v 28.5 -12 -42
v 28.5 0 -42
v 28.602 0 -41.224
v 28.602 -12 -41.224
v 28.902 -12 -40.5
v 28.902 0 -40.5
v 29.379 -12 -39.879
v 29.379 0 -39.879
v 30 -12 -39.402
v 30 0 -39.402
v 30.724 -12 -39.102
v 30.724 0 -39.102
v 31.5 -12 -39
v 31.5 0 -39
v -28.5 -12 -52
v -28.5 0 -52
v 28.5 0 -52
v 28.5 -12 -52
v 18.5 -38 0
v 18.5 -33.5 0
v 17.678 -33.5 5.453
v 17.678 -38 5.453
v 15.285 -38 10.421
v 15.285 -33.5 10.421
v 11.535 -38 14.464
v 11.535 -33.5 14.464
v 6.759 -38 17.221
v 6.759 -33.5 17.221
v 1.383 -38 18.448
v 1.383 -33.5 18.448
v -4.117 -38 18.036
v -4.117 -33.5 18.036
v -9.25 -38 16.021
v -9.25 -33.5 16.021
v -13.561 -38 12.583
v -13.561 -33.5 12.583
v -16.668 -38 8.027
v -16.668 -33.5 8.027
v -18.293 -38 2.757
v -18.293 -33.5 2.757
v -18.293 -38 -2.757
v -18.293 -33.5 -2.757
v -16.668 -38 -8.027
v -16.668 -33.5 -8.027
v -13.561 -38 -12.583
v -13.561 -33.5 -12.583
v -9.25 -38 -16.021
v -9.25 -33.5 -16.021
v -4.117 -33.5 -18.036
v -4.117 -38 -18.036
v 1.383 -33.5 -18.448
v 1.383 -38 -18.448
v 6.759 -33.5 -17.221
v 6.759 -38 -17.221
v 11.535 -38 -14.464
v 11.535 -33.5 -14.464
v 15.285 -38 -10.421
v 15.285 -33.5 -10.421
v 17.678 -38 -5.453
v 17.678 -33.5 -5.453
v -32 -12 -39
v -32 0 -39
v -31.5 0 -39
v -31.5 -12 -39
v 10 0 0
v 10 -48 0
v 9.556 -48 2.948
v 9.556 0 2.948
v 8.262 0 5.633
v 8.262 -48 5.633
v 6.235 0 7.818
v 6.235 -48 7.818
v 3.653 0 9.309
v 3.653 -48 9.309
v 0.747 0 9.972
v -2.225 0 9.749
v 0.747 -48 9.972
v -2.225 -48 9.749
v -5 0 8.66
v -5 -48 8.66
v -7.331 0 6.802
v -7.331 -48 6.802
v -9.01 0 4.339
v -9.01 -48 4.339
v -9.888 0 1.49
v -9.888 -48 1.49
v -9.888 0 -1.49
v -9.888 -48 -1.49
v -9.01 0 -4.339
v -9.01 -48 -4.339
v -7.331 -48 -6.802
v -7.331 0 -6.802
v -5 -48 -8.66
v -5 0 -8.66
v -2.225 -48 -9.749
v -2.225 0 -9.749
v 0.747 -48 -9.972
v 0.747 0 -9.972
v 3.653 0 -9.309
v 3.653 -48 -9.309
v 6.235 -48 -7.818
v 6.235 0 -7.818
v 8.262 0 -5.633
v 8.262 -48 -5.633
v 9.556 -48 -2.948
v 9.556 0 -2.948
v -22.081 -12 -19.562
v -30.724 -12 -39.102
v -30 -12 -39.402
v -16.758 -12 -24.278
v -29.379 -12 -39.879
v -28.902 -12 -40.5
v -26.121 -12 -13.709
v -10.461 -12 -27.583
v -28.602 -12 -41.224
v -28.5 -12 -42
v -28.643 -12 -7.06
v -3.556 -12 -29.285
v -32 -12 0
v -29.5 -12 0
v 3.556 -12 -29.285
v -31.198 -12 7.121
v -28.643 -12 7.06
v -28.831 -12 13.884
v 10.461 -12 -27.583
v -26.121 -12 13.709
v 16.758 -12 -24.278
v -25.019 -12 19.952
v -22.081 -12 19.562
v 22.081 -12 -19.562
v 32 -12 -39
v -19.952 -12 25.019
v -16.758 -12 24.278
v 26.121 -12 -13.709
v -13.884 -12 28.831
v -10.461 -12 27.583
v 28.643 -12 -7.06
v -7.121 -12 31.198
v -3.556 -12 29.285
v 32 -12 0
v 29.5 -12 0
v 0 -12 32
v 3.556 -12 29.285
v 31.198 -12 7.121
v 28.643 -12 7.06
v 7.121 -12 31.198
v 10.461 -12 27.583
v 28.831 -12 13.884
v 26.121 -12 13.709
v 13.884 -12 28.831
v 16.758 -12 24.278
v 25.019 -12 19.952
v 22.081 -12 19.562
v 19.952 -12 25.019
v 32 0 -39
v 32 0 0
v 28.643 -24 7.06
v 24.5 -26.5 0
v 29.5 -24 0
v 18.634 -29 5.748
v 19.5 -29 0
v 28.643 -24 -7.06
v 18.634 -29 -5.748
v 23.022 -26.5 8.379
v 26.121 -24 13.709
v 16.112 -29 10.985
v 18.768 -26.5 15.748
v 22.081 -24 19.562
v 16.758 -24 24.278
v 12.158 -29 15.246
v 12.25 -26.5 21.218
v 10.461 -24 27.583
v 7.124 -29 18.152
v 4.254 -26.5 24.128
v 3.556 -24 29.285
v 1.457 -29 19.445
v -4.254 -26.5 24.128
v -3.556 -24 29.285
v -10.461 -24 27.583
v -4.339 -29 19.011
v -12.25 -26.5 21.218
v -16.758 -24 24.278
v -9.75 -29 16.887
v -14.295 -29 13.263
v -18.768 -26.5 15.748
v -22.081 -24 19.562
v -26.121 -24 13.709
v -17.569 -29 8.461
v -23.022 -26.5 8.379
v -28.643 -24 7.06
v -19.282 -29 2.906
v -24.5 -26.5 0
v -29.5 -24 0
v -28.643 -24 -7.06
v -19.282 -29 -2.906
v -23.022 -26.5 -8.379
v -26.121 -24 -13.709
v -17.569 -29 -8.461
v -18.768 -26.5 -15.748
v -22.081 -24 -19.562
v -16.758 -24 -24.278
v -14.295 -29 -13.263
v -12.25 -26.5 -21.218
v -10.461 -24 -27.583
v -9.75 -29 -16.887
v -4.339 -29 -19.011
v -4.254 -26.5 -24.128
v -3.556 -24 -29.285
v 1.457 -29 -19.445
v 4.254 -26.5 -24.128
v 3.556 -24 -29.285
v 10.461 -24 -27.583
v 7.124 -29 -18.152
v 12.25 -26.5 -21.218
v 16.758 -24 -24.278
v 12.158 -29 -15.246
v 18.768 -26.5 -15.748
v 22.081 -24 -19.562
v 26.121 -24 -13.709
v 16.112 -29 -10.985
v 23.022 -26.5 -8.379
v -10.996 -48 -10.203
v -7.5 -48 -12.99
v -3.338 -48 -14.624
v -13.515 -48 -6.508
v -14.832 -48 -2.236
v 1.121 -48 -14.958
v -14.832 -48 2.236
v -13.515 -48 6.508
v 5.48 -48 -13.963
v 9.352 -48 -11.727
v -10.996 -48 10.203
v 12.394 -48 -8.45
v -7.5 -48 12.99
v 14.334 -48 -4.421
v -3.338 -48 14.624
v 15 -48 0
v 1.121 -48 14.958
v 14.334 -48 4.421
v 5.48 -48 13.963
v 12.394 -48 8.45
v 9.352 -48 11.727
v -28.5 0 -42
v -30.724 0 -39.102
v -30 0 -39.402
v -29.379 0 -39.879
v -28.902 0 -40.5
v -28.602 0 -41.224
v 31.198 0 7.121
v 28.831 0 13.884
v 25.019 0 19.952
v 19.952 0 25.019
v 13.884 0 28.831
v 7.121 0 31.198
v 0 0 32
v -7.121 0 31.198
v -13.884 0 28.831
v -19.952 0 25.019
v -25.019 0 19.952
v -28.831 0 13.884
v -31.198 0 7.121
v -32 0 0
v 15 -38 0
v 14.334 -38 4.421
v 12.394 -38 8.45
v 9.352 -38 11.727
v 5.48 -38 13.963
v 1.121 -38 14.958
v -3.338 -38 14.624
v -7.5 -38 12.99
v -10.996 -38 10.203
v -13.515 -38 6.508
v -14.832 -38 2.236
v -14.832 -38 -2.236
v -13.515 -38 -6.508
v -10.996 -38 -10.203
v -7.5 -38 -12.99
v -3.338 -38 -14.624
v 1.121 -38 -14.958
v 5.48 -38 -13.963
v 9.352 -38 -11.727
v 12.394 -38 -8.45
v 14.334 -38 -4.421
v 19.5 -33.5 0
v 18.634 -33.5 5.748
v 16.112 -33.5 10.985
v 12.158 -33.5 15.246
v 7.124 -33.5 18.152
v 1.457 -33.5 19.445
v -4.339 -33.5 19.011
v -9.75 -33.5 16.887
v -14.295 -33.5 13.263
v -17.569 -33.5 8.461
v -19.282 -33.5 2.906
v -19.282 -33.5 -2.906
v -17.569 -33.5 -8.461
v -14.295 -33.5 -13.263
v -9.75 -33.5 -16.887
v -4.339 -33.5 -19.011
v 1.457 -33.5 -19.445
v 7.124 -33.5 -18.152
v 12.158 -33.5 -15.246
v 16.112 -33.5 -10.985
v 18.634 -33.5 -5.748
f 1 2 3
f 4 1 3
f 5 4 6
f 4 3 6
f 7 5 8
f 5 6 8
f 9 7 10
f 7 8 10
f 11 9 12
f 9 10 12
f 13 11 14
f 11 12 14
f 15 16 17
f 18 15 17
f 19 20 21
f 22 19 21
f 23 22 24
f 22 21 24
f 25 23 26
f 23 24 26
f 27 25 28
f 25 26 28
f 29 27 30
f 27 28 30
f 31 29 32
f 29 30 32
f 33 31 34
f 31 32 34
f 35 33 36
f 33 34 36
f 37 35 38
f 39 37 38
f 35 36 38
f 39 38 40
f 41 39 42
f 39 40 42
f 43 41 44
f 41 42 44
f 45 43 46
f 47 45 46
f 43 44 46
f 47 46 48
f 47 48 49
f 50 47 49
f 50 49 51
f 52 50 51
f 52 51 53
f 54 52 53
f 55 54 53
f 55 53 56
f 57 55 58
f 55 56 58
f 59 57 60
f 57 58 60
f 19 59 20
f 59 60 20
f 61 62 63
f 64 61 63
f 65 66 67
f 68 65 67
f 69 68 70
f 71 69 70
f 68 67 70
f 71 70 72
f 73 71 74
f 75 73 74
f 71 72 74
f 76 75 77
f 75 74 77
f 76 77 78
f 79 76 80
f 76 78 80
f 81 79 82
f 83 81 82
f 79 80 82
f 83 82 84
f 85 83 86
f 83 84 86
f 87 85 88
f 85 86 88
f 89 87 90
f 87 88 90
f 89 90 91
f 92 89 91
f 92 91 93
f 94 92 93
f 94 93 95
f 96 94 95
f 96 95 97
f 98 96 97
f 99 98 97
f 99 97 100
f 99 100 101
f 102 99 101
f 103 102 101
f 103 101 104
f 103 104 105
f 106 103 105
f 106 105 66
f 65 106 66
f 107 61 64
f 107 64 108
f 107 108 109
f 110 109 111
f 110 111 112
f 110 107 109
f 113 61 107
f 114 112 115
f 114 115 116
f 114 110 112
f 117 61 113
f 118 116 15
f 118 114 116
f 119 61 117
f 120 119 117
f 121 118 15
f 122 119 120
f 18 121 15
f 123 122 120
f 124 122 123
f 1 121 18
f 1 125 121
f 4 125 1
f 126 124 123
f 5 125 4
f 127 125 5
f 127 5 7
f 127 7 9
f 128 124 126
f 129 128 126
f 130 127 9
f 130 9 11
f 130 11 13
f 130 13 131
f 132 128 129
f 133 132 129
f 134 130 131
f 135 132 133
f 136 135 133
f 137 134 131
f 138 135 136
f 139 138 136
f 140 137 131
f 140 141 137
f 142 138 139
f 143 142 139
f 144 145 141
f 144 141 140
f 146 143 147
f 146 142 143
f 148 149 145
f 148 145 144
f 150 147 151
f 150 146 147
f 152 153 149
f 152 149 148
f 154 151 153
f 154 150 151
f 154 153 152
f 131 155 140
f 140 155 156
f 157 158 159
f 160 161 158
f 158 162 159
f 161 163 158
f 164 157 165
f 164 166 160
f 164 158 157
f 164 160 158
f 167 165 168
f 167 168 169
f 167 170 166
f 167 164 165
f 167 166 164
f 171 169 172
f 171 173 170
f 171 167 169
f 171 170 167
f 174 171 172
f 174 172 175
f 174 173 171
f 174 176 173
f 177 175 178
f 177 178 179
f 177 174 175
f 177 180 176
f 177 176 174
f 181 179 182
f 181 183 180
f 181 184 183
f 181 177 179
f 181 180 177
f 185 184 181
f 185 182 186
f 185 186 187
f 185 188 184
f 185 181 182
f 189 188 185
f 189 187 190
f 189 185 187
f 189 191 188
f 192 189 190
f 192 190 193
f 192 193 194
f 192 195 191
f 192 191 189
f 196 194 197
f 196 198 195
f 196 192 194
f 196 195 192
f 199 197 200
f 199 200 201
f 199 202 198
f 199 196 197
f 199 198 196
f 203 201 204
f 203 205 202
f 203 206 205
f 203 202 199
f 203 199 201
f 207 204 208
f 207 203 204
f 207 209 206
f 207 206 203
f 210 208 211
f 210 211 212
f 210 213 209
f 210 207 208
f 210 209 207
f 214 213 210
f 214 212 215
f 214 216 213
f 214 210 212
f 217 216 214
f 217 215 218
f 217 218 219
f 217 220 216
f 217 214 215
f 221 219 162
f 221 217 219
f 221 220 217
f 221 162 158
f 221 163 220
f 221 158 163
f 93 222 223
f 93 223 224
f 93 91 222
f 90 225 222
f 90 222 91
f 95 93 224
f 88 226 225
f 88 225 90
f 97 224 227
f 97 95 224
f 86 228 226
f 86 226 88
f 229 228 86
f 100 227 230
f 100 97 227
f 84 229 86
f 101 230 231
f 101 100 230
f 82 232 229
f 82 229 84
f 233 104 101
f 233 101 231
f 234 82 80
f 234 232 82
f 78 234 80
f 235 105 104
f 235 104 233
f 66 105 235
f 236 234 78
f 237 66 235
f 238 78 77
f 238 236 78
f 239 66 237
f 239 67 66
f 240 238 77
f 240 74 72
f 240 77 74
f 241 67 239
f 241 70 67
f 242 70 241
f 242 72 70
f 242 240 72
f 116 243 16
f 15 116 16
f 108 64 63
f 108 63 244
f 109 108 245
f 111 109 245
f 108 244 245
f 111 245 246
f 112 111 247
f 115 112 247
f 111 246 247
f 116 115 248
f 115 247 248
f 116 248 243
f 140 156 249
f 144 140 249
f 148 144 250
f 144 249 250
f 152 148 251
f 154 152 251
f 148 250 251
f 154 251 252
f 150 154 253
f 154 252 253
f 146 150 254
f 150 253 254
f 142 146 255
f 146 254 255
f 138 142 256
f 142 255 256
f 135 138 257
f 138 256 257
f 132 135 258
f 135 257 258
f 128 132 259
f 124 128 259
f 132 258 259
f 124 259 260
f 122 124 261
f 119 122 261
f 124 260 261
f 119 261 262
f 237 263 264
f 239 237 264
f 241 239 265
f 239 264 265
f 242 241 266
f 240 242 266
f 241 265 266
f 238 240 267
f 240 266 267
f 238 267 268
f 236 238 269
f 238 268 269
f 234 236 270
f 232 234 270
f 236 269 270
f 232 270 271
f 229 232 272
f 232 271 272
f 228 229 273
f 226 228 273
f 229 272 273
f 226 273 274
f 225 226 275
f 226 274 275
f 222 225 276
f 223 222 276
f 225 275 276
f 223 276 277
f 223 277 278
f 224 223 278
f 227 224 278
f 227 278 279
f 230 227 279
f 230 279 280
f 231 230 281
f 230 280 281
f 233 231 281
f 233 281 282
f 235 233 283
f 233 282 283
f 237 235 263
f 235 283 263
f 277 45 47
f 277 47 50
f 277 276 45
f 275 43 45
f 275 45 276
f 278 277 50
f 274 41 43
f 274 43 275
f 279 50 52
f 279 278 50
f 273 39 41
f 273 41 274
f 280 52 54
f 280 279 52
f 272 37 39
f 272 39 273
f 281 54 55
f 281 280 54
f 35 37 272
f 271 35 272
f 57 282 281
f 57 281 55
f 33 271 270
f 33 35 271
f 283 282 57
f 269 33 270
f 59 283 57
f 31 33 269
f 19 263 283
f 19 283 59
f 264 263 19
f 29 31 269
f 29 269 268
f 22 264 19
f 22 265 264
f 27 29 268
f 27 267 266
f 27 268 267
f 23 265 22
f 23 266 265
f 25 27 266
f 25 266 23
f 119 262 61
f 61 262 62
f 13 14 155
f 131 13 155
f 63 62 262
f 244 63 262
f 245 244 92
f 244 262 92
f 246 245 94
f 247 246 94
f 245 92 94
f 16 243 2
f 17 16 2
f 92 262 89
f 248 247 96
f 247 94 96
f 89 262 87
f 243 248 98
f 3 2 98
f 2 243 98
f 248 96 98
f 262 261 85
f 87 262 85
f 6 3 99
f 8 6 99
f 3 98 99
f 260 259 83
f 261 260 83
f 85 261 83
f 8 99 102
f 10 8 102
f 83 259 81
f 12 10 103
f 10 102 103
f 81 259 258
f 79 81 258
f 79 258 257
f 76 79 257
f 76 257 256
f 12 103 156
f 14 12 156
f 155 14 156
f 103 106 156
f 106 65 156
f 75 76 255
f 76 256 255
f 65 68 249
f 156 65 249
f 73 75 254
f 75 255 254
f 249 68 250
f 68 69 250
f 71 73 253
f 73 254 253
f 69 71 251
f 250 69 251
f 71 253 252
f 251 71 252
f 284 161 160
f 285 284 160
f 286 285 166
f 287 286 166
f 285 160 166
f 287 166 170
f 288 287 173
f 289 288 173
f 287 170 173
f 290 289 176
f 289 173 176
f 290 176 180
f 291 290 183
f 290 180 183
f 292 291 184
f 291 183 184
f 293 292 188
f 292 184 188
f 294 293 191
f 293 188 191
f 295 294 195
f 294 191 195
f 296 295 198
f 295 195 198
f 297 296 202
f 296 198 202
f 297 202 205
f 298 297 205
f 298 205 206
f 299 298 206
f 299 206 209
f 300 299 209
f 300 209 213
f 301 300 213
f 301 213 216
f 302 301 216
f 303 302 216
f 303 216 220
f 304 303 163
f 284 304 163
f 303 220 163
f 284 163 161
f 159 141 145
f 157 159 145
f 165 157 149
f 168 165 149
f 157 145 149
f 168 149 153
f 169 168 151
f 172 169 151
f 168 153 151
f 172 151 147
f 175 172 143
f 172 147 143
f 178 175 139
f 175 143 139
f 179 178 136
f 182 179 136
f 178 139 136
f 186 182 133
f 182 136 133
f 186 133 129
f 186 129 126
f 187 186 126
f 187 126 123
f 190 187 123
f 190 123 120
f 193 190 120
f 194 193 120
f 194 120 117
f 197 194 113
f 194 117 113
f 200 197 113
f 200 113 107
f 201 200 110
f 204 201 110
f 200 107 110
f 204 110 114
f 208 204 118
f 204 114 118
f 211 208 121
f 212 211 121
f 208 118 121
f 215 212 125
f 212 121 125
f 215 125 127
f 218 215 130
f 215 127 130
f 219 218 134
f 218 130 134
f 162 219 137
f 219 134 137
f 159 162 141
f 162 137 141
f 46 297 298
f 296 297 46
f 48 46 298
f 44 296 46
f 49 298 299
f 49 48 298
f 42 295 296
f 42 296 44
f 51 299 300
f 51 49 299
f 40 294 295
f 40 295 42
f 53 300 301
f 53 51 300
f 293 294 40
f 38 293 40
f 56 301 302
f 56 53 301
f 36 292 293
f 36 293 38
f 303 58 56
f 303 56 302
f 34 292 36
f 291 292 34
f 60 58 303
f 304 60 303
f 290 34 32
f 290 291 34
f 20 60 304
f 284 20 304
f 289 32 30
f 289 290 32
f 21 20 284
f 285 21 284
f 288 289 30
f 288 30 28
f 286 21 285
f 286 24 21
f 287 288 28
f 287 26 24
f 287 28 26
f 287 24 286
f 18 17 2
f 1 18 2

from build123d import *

# Parameters (mm, degrees)
F1_DEPTH  = 12
F2_R      = 29.5
F3_DEPTH  = 12
F3_FACE_R = 29.5
F5_R      = 19.5
F7_DEPTH  = 4.5
F8_R      = 18.5
F9_DEPTH  = 4.5
F10_R     = 15
F11_DEPTH = 10
F12_R     = 10
F13_DEPTH = 48.001


with BuildPart() as f1:
    # F0 (on Front) → F1 (new body)
    with BuildSketch(Plane.XZ):
        with BuildLine():
            Line((-32, 0), (32, 0))
            ThreePointArc((32, 0), (0, 32), (-32, 0))
        make_face()
        with BuildLine():
            Line((32, -39), (32, 0))
            Line((32, 0), (-32, 0))
            Line((-32, 0), (-32, -39))
            Line((-32, -39), (-31.5, -39))
            ThreePointArc((-31.5, -39), (-29.3786796564, -39.8786796564), (-28.5, -42))
            Line((-28.5, -42), (-28.5, -52))
            Line((-28.5, -52), (28.5, -52))
            Line((28.5, -52), (28.5, -42))
            ThreePointArc((28.5, -42), (29.3786796564, -39.8786796564), (31.5, -39))
            Line((31.5, -39), (32, -39))
        make_face()
    extrude(amount=F1_DEPTH)

    # F2 (on face) → F3 (join)
    with BuildSketch(Plane.XZ.offset(12)):
        Circle(F2_R)
    extrude(amount=F3_DEPTH)

    # F3_face (on face) → F6 section 0
    with BuildSketch(Plane.XZ.offset(24)):
        Circle(F3_FACE_R)
    # F5 (on offset) → F6 section 1
    with BuildSketch(Plane.XZ.offset(29)):
        Circle(F5_R)
    loft()

    # F7 (add): a face of the model
    f7_faces = [f1.faces().sort_by_distance(p)[0] for p in [
        (0, -29, 0),
    ]]
    extrude(f7_faces, amount=F7_DEPTH)

    # F8 (on face) → F9 (join)
    with BuildSketch(Plane.XZ.offset(33.5)):
        Circle(F8_R)
    extrude(amount=F9_DEPTH)

    # F10 (on face) → F11 (join)
    with BuildSketch(Plane.XZ.offset(38)):
        Circle(F10_R)
    extrude(amount=F11_DEPTH)

    # F12 (on face) → F13 (cut, through all)
    with BuildSketch(Plane.XZ.offset(48)):
        Circle(F12_R)
    extrude(amount=-F13_DEPTH, mode=Mode.SUBTRACT)


solid = f1.part
